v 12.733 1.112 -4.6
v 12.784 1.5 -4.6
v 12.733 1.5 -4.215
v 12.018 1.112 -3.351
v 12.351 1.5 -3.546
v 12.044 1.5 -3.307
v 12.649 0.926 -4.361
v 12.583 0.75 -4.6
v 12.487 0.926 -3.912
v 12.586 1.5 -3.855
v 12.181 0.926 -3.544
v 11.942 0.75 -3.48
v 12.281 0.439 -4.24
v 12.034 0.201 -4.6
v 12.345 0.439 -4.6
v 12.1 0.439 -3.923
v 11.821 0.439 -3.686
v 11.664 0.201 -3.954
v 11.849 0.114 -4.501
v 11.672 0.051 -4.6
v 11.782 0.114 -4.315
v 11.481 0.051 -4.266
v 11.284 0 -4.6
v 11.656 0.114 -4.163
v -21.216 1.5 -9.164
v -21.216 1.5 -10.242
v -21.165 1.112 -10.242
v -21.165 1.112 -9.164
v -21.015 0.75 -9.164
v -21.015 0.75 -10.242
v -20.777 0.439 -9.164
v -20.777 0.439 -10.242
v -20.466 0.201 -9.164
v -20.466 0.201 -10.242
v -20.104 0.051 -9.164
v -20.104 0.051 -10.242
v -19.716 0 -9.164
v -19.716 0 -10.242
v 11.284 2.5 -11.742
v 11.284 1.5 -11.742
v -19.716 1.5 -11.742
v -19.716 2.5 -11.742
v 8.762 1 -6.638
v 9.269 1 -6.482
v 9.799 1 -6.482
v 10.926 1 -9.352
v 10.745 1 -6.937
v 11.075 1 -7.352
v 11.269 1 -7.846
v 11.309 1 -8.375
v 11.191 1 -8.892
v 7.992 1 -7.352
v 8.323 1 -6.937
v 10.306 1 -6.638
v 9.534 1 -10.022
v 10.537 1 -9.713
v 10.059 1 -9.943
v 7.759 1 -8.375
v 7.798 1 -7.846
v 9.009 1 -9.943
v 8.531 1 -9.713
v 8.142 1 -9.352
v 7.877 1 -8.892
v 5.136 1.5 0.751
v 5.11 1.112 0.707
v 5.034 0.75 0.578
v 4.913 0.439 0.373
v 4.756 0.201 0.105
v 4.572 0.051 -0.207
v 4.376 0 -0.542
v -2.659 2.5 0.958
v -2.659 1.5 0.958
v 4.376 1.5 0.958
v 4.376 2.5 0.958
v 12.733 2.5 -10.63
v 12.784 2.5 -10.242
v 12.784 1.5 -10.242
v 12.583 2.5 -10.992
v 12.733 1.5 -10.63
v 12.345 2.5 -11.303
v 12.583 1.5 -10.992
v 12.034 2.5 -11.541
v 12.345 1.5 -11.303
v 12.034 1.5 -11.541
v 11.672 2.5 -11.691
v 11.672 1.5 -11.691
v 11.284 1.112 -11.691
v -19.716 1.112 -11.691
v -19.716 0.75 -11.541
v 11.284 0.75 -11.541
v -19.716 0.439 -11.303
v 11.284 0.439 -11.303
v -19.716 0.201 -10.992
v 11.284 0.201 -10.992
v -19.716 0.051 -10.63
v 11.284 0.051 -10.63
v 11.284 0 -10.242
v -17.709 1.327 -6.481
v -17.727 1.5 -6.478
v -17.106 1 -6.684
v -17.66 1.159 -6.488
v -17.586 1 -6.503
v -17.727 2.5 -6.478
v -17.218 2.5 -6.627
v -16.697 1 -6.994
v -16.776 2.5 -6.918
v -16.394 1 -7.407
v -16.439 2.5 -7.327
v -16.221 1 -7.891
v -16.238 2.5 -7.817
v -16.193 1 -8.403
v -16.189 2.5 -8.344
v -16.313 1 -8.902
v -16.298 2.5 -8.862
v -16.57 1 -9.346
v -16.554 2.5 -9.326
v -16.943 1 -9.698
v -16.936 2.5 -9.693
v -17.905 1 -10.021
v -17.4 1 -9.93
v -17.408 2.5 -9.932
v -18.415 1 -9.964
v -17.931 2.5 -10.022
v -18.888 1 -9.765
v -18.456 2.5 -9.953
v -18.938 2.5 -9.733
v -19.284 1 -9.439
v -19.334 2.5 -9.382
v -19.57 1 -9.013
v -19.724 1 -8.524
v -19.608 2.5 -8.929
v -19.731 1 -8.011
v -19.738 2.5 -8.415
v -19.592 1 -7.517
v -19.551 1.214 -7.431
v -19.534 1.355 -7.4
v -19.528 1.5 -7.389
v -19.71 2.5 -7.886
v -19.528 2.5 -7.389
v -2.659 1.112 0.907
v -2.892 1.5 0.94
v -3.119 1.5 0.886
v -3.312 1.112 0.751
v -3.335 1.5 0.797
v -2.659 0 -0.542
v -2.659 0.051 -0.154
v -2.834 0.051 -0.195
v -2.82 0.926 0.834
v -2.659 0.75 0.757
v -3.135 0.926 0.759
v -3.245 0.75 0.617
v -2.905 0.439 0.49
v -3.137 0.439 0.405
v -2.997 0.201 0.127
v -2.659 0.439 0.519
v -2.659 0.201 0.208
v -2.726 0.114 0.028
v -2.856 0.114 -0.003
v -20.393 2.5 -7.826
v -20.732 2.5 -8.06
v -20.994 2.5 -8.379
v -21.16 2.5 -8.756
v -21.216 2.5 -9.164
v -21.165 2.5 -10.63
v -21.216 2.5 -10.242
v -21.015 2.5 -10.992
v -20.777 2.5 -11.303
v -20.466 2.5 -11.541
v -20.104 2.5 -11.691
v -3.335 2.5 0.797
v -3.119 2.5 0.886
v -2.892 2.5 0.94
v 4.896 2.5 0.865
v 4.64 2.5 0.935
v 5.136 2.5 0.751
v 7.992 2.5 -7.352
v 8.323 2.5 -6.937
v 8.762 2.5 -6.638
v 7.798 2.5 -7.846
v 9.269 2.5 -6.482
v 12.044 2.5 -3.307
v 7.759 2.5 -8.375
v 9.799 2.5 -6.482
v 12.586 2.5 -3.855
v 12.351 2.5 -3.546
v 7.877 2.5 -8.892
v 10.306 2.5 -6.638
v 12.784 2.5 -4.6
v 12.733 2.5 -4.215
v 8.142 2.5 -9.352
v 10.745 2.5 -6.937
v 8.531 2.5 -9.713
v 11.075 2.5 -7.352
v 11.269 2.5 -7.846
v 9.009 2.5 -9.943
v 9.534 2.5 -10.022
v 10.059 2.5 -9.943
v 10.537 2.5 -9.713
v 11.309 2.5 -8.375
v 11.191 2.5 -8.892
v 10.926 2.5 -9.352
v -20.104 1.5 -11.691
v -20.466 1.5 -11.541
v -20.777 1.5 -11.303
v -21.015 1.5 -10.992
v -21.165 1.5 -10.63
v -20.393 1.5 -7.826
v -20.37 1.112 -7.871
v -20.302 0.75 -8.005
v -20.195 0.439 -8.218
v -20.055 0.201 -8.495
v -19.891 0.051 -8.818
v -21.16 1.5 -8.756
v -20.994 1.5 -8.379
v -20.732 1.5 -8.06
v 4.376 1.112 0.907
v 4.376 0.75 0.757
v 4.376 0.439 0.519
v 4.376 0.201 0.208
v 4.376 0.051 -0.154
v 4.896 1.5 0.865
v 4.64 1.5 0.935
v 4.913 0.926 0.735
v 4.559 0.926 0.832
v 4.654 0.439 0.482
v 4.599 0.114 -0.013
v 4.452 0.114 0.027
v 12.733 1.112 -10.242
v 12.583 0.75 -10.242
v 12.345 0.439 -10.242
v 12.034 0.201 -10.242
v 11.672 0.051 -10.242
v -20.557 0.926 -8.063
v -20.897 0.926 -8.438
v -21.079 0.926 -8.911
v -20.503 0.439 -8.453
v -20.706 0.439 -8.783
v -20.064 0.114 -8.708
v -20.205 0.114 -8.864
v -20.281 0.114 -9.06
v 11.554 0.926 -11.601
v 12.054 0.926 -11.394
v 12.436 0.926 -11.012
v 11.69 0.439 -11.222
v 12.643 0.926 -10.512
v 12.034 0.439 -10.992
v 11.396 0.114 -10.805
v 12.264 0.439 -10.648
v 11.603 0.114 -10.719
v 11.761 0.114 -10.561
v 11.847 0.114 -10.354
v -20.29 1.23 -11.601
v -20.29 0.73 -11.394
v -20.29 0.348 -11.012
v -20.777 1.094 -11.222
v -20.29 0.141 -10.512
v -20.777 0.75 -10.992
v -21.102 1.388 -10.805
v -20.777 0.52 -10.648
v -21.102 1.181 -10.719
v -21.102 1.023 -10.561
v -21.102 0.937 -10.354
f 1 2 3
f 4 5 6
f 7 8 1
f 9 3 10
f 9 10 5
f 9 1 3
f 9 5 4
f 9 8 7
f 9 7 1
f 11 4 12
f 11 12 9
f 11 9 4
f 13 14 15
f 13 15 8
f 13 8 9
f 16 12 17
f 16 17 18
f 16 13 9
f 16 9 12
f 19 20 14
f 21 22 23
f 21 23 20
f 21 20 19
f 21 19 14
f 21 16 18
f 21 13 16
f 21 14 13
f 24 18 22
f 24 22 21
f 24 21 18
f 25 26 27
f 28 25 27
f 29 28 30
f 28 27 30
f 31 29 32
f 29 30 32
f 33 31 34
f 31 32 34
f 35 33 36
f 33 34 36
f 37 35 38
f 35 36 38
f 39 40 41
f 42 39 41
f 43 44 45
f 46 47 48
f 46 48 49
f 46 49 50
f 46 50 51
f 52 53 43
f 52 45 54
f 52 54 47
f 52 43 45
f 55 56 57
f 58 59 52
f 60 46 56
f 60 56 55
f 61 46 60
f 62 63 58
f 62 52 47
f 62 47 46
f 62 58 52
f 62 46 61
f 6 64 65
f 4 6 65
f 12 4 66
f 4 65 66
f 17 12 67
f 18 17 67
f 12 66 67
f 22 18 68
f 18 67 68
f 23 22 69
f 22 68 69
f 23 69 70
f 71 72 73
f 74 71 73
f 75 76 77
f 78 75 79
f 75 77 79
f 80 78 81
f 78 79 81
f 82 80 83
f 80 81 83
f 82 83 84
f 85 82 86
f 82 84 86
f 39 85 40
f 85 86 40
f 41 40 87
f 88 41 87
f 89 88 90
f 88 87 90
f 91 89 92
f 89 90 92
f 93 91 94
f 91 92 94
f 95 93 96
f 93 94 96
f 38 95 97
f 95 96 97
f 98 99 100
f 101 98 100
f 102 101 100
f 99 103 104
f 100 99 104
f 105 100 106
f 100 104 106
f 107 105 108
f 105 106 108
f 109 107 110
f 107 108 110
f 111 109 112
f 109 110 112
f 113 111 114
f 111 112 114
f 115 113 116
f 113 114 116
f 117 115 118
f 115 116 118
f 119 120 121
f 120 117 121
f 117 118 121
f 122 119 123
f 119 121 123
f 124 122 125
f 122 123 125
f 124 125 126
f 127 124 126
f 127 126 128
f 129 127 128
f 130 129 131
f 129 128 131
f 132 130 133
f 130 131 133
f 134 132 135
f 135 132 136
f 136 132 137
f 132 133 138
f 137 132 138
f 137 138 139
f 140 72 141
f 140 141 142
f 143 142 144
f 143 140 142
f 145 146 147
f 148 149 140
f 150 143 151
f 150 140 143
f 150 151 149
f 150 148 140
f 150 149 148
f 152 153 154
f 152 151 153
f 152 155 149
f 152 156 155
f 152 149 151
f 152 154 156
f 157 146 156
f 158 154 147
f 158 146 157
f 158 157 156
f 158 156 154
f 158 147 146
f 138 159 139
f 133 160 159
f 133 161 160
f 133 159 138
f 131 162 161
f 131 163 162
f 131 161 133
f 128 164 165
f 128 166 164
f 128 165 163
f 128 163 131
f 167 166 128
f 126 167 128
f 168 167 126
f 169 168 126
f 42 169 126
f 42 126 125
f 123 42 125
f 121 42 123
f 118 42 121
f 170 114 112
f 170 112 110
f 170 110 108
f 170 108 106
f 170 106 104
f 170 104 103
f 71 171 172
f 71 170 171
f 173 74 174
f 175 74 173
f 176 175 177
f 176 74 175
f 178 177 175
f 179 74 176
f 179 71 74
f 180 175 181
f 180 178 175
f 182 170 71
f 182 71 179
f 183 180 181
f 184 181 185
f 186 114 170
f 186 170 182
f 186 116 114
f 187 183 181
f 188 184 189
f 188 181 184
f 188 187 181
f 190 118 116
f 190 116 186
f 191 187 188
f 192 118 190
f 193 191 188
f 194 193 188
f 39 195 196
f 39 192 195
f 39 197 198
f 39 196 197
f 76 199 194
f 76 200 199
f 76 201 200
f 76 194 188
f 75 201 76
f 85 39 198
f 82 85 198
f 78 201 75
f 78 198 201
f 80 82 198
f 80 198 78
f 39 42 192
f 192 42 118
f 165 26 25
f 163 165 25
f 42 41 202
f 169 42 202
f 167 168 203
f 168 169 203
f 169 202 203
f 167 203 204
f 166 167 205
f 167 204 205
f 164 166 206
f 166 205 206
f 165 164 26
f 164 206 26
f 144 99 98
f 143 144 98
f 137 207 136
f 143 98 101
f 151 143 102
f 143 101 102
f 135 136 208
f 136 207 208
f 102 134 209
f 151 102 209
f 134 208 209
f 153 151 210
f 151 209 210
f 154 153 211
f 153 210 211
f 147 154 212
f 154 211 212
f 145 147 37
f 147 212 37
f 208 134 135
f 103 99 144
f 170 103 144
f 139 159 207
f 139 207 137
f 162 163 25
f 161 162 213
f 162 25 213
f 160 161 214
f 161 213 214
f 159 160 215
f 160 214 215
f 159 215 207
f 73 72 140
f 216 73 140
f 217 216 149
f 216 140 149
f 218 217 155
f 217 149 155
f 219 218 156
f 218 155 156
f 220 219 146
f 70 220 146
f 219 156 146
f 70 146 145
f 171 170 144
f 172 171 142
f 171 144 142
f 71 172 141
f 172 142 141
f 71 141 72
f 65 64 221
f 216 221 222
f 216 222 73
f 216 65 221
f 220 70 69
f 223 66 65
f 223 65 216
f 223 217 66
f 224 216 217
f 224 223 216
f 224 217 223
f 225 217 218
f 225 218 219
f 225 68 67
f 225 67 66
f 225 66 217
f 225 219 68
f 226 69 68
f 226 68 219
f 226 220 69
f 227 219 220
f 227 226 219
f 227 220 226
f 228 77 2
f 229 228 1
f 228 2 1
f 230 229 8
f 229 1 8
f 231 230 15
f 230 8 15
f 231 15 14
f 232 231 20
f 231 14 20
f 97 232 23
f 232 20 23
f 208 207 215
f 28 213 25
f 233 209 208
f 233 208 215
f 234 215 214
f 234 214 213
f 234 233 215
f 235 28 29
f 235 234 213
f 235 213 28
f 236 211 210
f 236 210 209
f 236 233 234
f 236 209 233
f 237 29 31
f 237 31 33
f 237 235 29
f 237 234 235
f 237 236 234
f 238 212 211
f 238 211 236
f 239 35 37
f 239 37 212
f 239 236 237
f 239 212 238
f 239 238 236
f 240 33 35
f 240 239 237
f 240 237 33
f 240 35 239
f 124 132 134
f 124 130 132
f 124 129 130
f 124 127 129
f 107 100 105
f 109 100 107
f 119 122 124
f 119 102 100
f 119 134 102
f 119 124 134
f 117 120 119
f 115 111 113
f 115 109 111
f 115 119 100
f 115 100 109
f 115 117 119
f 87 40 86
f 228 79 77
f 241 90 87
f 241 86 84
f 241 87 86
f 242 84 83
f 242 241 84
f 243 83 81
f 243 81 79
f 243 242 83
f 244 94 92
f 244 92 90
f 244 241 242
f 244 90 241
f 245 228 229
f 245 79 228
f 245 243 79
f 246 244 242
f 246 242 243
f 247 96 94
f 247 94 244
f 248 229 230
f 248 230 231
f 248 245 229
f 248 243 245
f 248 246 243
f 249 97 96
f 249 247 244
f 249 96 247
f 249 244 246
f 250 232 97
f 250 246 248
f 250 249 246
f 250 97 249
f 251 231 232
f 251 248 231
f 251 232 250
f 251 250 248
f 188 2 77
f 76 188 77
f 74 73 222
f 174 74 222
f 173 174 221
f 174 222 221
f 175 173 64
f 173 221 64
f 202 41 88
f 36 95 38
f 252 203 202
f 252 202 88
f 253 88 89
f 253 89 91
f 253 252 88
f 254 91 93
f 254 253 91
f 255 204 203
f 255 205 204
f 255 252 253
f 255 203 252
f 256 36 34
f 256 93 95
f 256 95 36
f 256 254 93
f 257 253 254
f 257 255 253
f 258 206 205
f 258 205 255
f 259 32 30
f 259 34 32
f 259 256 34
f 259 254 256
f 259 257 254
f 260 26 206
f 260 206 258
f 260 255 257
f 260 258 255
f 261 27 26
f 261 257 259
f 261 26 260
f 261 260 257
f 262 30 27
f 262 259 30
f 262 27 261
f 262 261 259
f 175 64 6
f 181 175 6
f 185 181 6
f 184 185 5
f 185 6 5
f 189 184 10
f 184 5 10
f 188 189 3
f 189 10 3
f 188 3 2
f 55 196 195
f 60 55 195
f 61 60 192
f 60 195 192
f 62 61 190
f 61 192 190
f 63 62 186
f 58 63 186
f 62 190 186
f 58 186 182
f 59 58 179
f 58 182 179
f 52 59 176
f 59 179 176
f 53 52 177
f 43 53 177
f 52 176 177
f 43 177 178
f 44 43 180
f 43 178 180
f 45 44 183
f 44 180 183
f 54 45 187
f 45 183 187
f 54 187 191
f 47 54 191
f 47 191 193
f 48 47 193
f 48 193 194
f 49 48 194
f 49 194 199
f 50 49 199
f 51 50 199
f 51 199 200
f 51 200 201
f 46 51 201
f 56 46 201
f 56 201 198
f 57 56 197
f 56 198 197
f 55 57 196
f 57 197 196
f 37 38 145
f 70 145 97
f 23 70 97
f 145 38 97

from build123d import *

# Parameters (mm, degrees)
BOSS_EXTRUDE1_DEPTH = 2.5
SKETCH4_R           = 1.78
CUT_EXTRUDE1_DEPTH  = 1.5
FILLET1_R           = 1.5


with BuildPart() as part:
    # Sketch2 → Boss-Extrude1 (new body)
    with BuildSketch(Plane(origin=(0, 0, 0), x_dir=(1, 0, 0), z_dir=(0, 1, 0))):
        Polygon((-21.216153836, 11.741903429), (-21.216153836, 8.241903429), (-3.016153836, -0.958096571), (4.783846164, -0.958096571), (12.783846164, 3.741903429), (12.783846164, 11.741903429), align=None)
    extrude(amount=BOSS_EXTRUDE1_DEPTH)

    # Sketch4 → Cut-Extrude1 (cut)
    with BuildSketch(Plane(origin=(0, 2.5, 0), x_dir=(1, 0, 0), z_dir=(0, 1, 0))):
        with Locations((-17.966153836, 8.241903429)):
            Circle(SKETCH4_R)
        with Locations(Location((9.533846164, 8.241903429, 0), (0, 0, 90))):
            Circle(SKETCH4_R)
    extrude(amount=-CUT_EXTRUDE1_DEPTH, mode=Mode.SUBTRACT)

    # Fillet1
    # the kernel refuses this fillet: 1.5 mm, written as the material it takes off along each edge
    with BuildSketch(Plane(origin=(4.375823919, 1.5, -0.541903429), x_dir=(0.5065490486308655, 0, 0.8622111466057285), z_dir=(0, -1, 0))) as fillet1_piece_1_section:
        Polygon((0, 0), (FILLET1_R, 0), (FILLET1_R, FILLET1_R * 0.272014830087), (FILLET1_R * 0.862211146606, FILLET1_R * 0.506549048631), align=None)
    fillet1_piece_1 = extrude(amount=FILLET1_R, mode=Mode.PRIVATE)
    fillet1_piece_1 = fillet1_piece_1 - Plane(origin=(4.375823919, 1.5, -0.541903429), x_dir=(-0.2624774784569825, 0, -0.964938118898235), z_dir=(0, -1, 0)) * Sphere(FILLET1_R, mode=Mode.PRIVATE)
    add(fillet1_piece_1, mode=Mode.SUBTRACT)
    with BuildSketch(Plane(origin=(-2.658577298, 1.5, -0.541903429), x_dir=(-0.4511321826525704, 0, 0.8924571439431296), z_dir=(0, -1, 0))) as fillet1_piece_2_section:
        Polygon((0, 0), (FILLET1_R, 0), (FILLET1_R, -FILLET1_R * 0.238384358714), (FILLET1_R * 0.892457143943, -FILLET1_R * 0.451132182653), align=None)
    fillet1_piece_2 = extrude(amount=FILLET1_R, mode=Mode.PRIVATE)
    fillet1_piece_2 = fillet1_piece_2 - Plane(origin=(-2.658577298, 1.5, -0.541903429), x_dir=(0.23188667065710186, 0, -0.972742808748317), z_dir=(0, -1, 0)) * Sphere(FILLET1_R, mode=Mode.PRIVATE)
    add(fillet1_piece_2, mode=Mode.SUBTRACT)
    with BuildSketch(Plane(origin=(-19.716153836, 1.5, -10.241903429), x_dir=(0, -1, 0), z_dir=(-1, 0, 0))) as fillet1_piece_3_section:
        Polygon((0, 0), (FILLET1_R, 0), (FILLET1_R, -FILLET1_R), (0, -FILLET1_R), align=None)
    fillet1_piece_3 = extrude(amount=FILLET1_R, mode=Mode.PRIVATE)
    fillet1_piece_3 = fillet1_piece_3 - Plane(origin=(-19.716153836, 1.5, -10.241903429), x_dir=(0, 0.7071067811865475, 0.7071067811865475), z_dir=(-1, 0, 0)) * Sphere(FILLET1_R, mode=Mode.PRIVATE)
    add(fillet1_piece_3, mode=Mode.SUBTRACT)
    with BuildSketch(Plane(origin=(-19.716153836, 1.5, -9.164414646), x_dir=(-0.4511321826525704, 0, 0.8924571439431296), z_dir=(0, -1, 0))) as fillet1_piece_4_section:
        Polygon((0, 0), (FILLET1_R, 0), (FILLET1_R, FILLET1_R * 0.615007478031), (FILLET1_R * 0.451132182653, FILLET1_R * 0.892457143943), align=None)
    fillet1_piece_4 = extrude(amount=FILLET1_R, mode=Mode.PRIVATE)
    fillet1_piece_4 = fillet1_piece_4 - Plane(origin=(-19.716153836, 1.5, -9.164414646), x_dir=(0.8518016737047921, 0, -0.5238643991279756), z_dir=(0, -1, 0)) * Sphere(FILLET1_R, mode=Mode.PRIVATE)
    add(fillet1_piece_4, mode=Mode.SUBTRACT)
    with BuildSketch(Plane(origin=(11.283846164, 1.5, -4.600366498), x_dir=(1, 0, 0), z_dir=(0, -1, 0))) as fillet1_piece_5_section:
        Polygon((0, 0), (FILLET1_R, 0), (FILLET1_R, FILLET1_R * 0.572308712676), (FILLET1_R * 0.506549048631, FILLET1_R * 0.862211146606), align=None)
    fillet1_piece_5 = extrude(amount=FILLET1_R, mode=Mode.PRIVATE)
    fillet1_piece_5 = fillet1_piece_5 - Plane(origin=(11.283846164, 1.5, -4.600366498), x_dir=(-0.8679138922240112, 0, -0.49671468237265487), z_dir=(0, -1, 0)) * Sphere(FILLET1_R, mode=Mode.PRIVATE)
    add(fillet1_piece_5, mode=Mode.SUBTRACT)
    with BuildSketch(Plane(origin=(11.283846164, 1.5, -10.241903429), x_dir=(0, 0, -1), z_dir=(0, -1, 0))) as fillet1_piece_6_section:
        Polygon((0, 0), (FILLET1_R, 0), (FILLET1_R, FILLET1_R), (0, FILLET1_R), align=None)
    fillet1_piece_6 = extrude(amount=FILLET1_R, mode=Mode.PRIVATE)
    fillet1_piece_6 = fillet1_piece_6 - Plane(origin=(11.283846164, 1.5, -10.241903429), x_dir=(-0.7071067811865477, 0, 0.7071067811865474), z_dir=(0, -1, 0)) * Sphere(FILLET1_R, mode=Mode.PRIVATE)
    add(fillet1_piece_6, mode=Mode.SUBTRACT)
    with BuildSketch(Plane(origin=(4.783846164, 1.5, 0.958096571), x_dir=(0.8622111466057288, 0, -0.506549048630865), z_dir=(0, 1, 0))) as fillet1_piece_7:
        with BuildLine():
            CenterArc((FILLET1_R * 0.272014830087, FILLET1_R), FILLET1_R, 239.565764247, 30.434235753)
            Line((-FILLET1_R * 0.234534218543, FILLET1_R * 0.137788853394), (0, 0))
            Line((0, 0), (FILLET1_R * 0.272014830087, 0))
        make_face()
    extrude(amount=2.020055613, mode=Mode.SUBTRACT)
    with BuildSketch(Plane(origin=(-3.016153836, 1.5, 0.958096571), x_dir=(1, 0, 0), z_dir=(0, 1, 0))) as fillet1_piece_8:
        with BuildLine():
            CenterArc((FILLET1_R * 0.238384358714, FILLET1_R), FILLET1_R, 243.183653156, 26.816346844)
            Line((-FILLET1_R * 0.212747823939, FILLET1_R * 0.107542856057), (0, 0))
            Line((0, 0), (FILLET1_R * 0.238384358714, 0))
        make_face()
    extrude(amount=1.893941345, mode=Mode.SUBTRACT)
    with BuildSketch(Plane(origin=(-21.216153836, 0, -10.241903429), x_dir=(0, 1, 0), z_dir=(0, 0, 1))) as fillet1_piece_9:
        with BuildLine():
            CenterArc((FILLET1_R, -FILLET1_R), FILLET1_R, 90, 90)
            Line((0, -FILLET1_R), (0, 0))
            Line((0, 0), (FILLET1_R, 0))
        make_face()
    extrude(amount=1.077488783, mode=Mode.SUBTRACT)
    with BuildSketch(Plane(origin=(-20.39285211, 0, -7.825728931), x_dir=(0.4511321826525704, 0, -0.8924571439431296), z_dir=(0.8924571439431296, 0, 0.4511321826525704))) as fillet1_piece_10:
        with BuildLine():
            CenterArc((FILLET1_R, FILLET1_R), FILLET1_R, 180, 90)
            Line((0, FILLET1_R), (0, 0))
            Line((0, 0), (FILLET1_R, 0))
        make_face()
    extrude(amount=19.113048345, mode=Mode.SUBTRACT)
    with BuildSketch(Plane(origin=(-2.658577298, 0, 0.958096571), x_dir=(0, 1, 0), z_dir=(1, 0, 0))) as fillet1_piece_11:
        with BuildLine():
            CenterArc((FILLET1_R, -FILLET1_R), FILLET1_R, 90, 90)
            Line((0, -FILLET1_R), (0, 0))
            Line((0, 0), (FILLET1_R, 0))
        make_face()
    extrude(amount=7.034401217, mode=Mode.SUBTRACT)
    with BuildSketch(Plane(origin=(5.135647492, 0, 0.751413291), x_dir=(0, 1, 0), z_dir=(0.8622111466057285, 0, -0.5065490486308655))) as fillet1_piece_12:
        with BuildLine():
            CenterArc((FILLET1_R, -FILLET1_R), FILLET1_R, 90, 90)
            Line((0, -FILLET1_R), (0, 0))
            Line((0, 0), (FILLET1_R, 0))
        make_face()
    extrude(amount=8.011984387, mode=Mode.SUBTRACT)
    with BuildSketch(Plane(origin=(12.783846164, 1.5, -3.741903429), x_dir=(0, 0, -1), z_dir=(0, 1, 0))) as fillet1_piece_13:
        with BuildLine():
            CenterArc((FILLET1_R * 0.572308712676, FILLET1_R), FILLET1_R, 210.434235753, 59.565764247)
            Line((-FILLET1_R * 0.289902433929, FILLET1_R * 0.493450951369), (0, 0))
            Line((0, 0), (FILLET1_R * 0.572308712676, 0))
        make_face()
    extrude(amount=3.146157673, mode=Mode.SUBTRACT)
    with BuildSketch(Plane(origin=(12.783846164, 0, -4.600366498), x_dir=(0, 1, 0), z_dir=(0, 0, -1))) as fillet1_piece_14:
        with BuildLine():
            CenterArc((FILLET1_R, -FILLET1_R), FILLET1_R, 90, 90)
            Line((0, -FILLET1_R), (0, 0))
            Line((0, 0), (FILLET1_R, 0))
        make_face()
    extrude(amount=5.641536931, mode=Mode.SUBTRACT)
    with BuildSketch(Plane(origin=(11.283846164, 0, -11.741903429), x_dir=(0, 0, 1), z_dir=(-1, 0, 0))) as fillet1_piece_15:
        with BuildLine():
            CenterArc((FILLET1_R, FILLET1_R), FILLET1_R, 180, 90)
            Line((0, FILLET1_R), (0, 0))
            Line((0, 0), (FILLET1_R, 0))
        make_face()
    extrude(amount=31, mode=Mode.SUBTRACT)
    with BuildSketch(Plane(origin=(12.783846164, 1.5, -11.741903429), x_dir=(0, 0, 1), z_dir=(0, 1, 0))) as fillet1_piece_16:
        with BuildLine():
            CenterArc((FILLET1_R, -FILLET1_R), FILLET1_R, 90, 90)
            Line((0, -FILLET1_R), (0, 0))
            Line((0, 0), (FILLET1_R, 0))
        make_face()
    extrude(amount=4.75, mode=Mode.SUBTRACT)
    with BuildSketch(Plane(origin=(-21.216153836, 1.5, -8.241903429), x_dir=(0, 0, -1), z_dir=(0, 1, 0))) as fillet1_piece_17:
        with BuildLine():
            CenterArc((FILLET1_R * 0.615007478031, -FILLET1_R), FILLET1_R, 90, 63.183653156)
            Line((-FILLET1_R * 0.277449665912, -FILLET1_R * 0.548867817347), (0, 0))
            Line((0, 0), (FILLET1_R * 0.615007478031, 0))
        make_face()
    extrude(amount=3.306278043, mode=Mode.SUBTRACT)
    with BuildSketch(Plane(origin=(-21.216153836, 1.5, -11.741903429), x_dir=(0, 0, 1), z_dir=(0, 1, 0))) as fillet1_piece_18:
        with BuildLine():
            CenterArc((FILLET1_R, FILLET1_R), FILLET1_R, 180, 90)
            Line((0, FILLET1_R), (0, 0))
            Line((0, 0), (FILLET1_R, 0))
        make_face()
    extrude(amount=4.75, mode=Mode.SUBTRACT)


solid = part.part
